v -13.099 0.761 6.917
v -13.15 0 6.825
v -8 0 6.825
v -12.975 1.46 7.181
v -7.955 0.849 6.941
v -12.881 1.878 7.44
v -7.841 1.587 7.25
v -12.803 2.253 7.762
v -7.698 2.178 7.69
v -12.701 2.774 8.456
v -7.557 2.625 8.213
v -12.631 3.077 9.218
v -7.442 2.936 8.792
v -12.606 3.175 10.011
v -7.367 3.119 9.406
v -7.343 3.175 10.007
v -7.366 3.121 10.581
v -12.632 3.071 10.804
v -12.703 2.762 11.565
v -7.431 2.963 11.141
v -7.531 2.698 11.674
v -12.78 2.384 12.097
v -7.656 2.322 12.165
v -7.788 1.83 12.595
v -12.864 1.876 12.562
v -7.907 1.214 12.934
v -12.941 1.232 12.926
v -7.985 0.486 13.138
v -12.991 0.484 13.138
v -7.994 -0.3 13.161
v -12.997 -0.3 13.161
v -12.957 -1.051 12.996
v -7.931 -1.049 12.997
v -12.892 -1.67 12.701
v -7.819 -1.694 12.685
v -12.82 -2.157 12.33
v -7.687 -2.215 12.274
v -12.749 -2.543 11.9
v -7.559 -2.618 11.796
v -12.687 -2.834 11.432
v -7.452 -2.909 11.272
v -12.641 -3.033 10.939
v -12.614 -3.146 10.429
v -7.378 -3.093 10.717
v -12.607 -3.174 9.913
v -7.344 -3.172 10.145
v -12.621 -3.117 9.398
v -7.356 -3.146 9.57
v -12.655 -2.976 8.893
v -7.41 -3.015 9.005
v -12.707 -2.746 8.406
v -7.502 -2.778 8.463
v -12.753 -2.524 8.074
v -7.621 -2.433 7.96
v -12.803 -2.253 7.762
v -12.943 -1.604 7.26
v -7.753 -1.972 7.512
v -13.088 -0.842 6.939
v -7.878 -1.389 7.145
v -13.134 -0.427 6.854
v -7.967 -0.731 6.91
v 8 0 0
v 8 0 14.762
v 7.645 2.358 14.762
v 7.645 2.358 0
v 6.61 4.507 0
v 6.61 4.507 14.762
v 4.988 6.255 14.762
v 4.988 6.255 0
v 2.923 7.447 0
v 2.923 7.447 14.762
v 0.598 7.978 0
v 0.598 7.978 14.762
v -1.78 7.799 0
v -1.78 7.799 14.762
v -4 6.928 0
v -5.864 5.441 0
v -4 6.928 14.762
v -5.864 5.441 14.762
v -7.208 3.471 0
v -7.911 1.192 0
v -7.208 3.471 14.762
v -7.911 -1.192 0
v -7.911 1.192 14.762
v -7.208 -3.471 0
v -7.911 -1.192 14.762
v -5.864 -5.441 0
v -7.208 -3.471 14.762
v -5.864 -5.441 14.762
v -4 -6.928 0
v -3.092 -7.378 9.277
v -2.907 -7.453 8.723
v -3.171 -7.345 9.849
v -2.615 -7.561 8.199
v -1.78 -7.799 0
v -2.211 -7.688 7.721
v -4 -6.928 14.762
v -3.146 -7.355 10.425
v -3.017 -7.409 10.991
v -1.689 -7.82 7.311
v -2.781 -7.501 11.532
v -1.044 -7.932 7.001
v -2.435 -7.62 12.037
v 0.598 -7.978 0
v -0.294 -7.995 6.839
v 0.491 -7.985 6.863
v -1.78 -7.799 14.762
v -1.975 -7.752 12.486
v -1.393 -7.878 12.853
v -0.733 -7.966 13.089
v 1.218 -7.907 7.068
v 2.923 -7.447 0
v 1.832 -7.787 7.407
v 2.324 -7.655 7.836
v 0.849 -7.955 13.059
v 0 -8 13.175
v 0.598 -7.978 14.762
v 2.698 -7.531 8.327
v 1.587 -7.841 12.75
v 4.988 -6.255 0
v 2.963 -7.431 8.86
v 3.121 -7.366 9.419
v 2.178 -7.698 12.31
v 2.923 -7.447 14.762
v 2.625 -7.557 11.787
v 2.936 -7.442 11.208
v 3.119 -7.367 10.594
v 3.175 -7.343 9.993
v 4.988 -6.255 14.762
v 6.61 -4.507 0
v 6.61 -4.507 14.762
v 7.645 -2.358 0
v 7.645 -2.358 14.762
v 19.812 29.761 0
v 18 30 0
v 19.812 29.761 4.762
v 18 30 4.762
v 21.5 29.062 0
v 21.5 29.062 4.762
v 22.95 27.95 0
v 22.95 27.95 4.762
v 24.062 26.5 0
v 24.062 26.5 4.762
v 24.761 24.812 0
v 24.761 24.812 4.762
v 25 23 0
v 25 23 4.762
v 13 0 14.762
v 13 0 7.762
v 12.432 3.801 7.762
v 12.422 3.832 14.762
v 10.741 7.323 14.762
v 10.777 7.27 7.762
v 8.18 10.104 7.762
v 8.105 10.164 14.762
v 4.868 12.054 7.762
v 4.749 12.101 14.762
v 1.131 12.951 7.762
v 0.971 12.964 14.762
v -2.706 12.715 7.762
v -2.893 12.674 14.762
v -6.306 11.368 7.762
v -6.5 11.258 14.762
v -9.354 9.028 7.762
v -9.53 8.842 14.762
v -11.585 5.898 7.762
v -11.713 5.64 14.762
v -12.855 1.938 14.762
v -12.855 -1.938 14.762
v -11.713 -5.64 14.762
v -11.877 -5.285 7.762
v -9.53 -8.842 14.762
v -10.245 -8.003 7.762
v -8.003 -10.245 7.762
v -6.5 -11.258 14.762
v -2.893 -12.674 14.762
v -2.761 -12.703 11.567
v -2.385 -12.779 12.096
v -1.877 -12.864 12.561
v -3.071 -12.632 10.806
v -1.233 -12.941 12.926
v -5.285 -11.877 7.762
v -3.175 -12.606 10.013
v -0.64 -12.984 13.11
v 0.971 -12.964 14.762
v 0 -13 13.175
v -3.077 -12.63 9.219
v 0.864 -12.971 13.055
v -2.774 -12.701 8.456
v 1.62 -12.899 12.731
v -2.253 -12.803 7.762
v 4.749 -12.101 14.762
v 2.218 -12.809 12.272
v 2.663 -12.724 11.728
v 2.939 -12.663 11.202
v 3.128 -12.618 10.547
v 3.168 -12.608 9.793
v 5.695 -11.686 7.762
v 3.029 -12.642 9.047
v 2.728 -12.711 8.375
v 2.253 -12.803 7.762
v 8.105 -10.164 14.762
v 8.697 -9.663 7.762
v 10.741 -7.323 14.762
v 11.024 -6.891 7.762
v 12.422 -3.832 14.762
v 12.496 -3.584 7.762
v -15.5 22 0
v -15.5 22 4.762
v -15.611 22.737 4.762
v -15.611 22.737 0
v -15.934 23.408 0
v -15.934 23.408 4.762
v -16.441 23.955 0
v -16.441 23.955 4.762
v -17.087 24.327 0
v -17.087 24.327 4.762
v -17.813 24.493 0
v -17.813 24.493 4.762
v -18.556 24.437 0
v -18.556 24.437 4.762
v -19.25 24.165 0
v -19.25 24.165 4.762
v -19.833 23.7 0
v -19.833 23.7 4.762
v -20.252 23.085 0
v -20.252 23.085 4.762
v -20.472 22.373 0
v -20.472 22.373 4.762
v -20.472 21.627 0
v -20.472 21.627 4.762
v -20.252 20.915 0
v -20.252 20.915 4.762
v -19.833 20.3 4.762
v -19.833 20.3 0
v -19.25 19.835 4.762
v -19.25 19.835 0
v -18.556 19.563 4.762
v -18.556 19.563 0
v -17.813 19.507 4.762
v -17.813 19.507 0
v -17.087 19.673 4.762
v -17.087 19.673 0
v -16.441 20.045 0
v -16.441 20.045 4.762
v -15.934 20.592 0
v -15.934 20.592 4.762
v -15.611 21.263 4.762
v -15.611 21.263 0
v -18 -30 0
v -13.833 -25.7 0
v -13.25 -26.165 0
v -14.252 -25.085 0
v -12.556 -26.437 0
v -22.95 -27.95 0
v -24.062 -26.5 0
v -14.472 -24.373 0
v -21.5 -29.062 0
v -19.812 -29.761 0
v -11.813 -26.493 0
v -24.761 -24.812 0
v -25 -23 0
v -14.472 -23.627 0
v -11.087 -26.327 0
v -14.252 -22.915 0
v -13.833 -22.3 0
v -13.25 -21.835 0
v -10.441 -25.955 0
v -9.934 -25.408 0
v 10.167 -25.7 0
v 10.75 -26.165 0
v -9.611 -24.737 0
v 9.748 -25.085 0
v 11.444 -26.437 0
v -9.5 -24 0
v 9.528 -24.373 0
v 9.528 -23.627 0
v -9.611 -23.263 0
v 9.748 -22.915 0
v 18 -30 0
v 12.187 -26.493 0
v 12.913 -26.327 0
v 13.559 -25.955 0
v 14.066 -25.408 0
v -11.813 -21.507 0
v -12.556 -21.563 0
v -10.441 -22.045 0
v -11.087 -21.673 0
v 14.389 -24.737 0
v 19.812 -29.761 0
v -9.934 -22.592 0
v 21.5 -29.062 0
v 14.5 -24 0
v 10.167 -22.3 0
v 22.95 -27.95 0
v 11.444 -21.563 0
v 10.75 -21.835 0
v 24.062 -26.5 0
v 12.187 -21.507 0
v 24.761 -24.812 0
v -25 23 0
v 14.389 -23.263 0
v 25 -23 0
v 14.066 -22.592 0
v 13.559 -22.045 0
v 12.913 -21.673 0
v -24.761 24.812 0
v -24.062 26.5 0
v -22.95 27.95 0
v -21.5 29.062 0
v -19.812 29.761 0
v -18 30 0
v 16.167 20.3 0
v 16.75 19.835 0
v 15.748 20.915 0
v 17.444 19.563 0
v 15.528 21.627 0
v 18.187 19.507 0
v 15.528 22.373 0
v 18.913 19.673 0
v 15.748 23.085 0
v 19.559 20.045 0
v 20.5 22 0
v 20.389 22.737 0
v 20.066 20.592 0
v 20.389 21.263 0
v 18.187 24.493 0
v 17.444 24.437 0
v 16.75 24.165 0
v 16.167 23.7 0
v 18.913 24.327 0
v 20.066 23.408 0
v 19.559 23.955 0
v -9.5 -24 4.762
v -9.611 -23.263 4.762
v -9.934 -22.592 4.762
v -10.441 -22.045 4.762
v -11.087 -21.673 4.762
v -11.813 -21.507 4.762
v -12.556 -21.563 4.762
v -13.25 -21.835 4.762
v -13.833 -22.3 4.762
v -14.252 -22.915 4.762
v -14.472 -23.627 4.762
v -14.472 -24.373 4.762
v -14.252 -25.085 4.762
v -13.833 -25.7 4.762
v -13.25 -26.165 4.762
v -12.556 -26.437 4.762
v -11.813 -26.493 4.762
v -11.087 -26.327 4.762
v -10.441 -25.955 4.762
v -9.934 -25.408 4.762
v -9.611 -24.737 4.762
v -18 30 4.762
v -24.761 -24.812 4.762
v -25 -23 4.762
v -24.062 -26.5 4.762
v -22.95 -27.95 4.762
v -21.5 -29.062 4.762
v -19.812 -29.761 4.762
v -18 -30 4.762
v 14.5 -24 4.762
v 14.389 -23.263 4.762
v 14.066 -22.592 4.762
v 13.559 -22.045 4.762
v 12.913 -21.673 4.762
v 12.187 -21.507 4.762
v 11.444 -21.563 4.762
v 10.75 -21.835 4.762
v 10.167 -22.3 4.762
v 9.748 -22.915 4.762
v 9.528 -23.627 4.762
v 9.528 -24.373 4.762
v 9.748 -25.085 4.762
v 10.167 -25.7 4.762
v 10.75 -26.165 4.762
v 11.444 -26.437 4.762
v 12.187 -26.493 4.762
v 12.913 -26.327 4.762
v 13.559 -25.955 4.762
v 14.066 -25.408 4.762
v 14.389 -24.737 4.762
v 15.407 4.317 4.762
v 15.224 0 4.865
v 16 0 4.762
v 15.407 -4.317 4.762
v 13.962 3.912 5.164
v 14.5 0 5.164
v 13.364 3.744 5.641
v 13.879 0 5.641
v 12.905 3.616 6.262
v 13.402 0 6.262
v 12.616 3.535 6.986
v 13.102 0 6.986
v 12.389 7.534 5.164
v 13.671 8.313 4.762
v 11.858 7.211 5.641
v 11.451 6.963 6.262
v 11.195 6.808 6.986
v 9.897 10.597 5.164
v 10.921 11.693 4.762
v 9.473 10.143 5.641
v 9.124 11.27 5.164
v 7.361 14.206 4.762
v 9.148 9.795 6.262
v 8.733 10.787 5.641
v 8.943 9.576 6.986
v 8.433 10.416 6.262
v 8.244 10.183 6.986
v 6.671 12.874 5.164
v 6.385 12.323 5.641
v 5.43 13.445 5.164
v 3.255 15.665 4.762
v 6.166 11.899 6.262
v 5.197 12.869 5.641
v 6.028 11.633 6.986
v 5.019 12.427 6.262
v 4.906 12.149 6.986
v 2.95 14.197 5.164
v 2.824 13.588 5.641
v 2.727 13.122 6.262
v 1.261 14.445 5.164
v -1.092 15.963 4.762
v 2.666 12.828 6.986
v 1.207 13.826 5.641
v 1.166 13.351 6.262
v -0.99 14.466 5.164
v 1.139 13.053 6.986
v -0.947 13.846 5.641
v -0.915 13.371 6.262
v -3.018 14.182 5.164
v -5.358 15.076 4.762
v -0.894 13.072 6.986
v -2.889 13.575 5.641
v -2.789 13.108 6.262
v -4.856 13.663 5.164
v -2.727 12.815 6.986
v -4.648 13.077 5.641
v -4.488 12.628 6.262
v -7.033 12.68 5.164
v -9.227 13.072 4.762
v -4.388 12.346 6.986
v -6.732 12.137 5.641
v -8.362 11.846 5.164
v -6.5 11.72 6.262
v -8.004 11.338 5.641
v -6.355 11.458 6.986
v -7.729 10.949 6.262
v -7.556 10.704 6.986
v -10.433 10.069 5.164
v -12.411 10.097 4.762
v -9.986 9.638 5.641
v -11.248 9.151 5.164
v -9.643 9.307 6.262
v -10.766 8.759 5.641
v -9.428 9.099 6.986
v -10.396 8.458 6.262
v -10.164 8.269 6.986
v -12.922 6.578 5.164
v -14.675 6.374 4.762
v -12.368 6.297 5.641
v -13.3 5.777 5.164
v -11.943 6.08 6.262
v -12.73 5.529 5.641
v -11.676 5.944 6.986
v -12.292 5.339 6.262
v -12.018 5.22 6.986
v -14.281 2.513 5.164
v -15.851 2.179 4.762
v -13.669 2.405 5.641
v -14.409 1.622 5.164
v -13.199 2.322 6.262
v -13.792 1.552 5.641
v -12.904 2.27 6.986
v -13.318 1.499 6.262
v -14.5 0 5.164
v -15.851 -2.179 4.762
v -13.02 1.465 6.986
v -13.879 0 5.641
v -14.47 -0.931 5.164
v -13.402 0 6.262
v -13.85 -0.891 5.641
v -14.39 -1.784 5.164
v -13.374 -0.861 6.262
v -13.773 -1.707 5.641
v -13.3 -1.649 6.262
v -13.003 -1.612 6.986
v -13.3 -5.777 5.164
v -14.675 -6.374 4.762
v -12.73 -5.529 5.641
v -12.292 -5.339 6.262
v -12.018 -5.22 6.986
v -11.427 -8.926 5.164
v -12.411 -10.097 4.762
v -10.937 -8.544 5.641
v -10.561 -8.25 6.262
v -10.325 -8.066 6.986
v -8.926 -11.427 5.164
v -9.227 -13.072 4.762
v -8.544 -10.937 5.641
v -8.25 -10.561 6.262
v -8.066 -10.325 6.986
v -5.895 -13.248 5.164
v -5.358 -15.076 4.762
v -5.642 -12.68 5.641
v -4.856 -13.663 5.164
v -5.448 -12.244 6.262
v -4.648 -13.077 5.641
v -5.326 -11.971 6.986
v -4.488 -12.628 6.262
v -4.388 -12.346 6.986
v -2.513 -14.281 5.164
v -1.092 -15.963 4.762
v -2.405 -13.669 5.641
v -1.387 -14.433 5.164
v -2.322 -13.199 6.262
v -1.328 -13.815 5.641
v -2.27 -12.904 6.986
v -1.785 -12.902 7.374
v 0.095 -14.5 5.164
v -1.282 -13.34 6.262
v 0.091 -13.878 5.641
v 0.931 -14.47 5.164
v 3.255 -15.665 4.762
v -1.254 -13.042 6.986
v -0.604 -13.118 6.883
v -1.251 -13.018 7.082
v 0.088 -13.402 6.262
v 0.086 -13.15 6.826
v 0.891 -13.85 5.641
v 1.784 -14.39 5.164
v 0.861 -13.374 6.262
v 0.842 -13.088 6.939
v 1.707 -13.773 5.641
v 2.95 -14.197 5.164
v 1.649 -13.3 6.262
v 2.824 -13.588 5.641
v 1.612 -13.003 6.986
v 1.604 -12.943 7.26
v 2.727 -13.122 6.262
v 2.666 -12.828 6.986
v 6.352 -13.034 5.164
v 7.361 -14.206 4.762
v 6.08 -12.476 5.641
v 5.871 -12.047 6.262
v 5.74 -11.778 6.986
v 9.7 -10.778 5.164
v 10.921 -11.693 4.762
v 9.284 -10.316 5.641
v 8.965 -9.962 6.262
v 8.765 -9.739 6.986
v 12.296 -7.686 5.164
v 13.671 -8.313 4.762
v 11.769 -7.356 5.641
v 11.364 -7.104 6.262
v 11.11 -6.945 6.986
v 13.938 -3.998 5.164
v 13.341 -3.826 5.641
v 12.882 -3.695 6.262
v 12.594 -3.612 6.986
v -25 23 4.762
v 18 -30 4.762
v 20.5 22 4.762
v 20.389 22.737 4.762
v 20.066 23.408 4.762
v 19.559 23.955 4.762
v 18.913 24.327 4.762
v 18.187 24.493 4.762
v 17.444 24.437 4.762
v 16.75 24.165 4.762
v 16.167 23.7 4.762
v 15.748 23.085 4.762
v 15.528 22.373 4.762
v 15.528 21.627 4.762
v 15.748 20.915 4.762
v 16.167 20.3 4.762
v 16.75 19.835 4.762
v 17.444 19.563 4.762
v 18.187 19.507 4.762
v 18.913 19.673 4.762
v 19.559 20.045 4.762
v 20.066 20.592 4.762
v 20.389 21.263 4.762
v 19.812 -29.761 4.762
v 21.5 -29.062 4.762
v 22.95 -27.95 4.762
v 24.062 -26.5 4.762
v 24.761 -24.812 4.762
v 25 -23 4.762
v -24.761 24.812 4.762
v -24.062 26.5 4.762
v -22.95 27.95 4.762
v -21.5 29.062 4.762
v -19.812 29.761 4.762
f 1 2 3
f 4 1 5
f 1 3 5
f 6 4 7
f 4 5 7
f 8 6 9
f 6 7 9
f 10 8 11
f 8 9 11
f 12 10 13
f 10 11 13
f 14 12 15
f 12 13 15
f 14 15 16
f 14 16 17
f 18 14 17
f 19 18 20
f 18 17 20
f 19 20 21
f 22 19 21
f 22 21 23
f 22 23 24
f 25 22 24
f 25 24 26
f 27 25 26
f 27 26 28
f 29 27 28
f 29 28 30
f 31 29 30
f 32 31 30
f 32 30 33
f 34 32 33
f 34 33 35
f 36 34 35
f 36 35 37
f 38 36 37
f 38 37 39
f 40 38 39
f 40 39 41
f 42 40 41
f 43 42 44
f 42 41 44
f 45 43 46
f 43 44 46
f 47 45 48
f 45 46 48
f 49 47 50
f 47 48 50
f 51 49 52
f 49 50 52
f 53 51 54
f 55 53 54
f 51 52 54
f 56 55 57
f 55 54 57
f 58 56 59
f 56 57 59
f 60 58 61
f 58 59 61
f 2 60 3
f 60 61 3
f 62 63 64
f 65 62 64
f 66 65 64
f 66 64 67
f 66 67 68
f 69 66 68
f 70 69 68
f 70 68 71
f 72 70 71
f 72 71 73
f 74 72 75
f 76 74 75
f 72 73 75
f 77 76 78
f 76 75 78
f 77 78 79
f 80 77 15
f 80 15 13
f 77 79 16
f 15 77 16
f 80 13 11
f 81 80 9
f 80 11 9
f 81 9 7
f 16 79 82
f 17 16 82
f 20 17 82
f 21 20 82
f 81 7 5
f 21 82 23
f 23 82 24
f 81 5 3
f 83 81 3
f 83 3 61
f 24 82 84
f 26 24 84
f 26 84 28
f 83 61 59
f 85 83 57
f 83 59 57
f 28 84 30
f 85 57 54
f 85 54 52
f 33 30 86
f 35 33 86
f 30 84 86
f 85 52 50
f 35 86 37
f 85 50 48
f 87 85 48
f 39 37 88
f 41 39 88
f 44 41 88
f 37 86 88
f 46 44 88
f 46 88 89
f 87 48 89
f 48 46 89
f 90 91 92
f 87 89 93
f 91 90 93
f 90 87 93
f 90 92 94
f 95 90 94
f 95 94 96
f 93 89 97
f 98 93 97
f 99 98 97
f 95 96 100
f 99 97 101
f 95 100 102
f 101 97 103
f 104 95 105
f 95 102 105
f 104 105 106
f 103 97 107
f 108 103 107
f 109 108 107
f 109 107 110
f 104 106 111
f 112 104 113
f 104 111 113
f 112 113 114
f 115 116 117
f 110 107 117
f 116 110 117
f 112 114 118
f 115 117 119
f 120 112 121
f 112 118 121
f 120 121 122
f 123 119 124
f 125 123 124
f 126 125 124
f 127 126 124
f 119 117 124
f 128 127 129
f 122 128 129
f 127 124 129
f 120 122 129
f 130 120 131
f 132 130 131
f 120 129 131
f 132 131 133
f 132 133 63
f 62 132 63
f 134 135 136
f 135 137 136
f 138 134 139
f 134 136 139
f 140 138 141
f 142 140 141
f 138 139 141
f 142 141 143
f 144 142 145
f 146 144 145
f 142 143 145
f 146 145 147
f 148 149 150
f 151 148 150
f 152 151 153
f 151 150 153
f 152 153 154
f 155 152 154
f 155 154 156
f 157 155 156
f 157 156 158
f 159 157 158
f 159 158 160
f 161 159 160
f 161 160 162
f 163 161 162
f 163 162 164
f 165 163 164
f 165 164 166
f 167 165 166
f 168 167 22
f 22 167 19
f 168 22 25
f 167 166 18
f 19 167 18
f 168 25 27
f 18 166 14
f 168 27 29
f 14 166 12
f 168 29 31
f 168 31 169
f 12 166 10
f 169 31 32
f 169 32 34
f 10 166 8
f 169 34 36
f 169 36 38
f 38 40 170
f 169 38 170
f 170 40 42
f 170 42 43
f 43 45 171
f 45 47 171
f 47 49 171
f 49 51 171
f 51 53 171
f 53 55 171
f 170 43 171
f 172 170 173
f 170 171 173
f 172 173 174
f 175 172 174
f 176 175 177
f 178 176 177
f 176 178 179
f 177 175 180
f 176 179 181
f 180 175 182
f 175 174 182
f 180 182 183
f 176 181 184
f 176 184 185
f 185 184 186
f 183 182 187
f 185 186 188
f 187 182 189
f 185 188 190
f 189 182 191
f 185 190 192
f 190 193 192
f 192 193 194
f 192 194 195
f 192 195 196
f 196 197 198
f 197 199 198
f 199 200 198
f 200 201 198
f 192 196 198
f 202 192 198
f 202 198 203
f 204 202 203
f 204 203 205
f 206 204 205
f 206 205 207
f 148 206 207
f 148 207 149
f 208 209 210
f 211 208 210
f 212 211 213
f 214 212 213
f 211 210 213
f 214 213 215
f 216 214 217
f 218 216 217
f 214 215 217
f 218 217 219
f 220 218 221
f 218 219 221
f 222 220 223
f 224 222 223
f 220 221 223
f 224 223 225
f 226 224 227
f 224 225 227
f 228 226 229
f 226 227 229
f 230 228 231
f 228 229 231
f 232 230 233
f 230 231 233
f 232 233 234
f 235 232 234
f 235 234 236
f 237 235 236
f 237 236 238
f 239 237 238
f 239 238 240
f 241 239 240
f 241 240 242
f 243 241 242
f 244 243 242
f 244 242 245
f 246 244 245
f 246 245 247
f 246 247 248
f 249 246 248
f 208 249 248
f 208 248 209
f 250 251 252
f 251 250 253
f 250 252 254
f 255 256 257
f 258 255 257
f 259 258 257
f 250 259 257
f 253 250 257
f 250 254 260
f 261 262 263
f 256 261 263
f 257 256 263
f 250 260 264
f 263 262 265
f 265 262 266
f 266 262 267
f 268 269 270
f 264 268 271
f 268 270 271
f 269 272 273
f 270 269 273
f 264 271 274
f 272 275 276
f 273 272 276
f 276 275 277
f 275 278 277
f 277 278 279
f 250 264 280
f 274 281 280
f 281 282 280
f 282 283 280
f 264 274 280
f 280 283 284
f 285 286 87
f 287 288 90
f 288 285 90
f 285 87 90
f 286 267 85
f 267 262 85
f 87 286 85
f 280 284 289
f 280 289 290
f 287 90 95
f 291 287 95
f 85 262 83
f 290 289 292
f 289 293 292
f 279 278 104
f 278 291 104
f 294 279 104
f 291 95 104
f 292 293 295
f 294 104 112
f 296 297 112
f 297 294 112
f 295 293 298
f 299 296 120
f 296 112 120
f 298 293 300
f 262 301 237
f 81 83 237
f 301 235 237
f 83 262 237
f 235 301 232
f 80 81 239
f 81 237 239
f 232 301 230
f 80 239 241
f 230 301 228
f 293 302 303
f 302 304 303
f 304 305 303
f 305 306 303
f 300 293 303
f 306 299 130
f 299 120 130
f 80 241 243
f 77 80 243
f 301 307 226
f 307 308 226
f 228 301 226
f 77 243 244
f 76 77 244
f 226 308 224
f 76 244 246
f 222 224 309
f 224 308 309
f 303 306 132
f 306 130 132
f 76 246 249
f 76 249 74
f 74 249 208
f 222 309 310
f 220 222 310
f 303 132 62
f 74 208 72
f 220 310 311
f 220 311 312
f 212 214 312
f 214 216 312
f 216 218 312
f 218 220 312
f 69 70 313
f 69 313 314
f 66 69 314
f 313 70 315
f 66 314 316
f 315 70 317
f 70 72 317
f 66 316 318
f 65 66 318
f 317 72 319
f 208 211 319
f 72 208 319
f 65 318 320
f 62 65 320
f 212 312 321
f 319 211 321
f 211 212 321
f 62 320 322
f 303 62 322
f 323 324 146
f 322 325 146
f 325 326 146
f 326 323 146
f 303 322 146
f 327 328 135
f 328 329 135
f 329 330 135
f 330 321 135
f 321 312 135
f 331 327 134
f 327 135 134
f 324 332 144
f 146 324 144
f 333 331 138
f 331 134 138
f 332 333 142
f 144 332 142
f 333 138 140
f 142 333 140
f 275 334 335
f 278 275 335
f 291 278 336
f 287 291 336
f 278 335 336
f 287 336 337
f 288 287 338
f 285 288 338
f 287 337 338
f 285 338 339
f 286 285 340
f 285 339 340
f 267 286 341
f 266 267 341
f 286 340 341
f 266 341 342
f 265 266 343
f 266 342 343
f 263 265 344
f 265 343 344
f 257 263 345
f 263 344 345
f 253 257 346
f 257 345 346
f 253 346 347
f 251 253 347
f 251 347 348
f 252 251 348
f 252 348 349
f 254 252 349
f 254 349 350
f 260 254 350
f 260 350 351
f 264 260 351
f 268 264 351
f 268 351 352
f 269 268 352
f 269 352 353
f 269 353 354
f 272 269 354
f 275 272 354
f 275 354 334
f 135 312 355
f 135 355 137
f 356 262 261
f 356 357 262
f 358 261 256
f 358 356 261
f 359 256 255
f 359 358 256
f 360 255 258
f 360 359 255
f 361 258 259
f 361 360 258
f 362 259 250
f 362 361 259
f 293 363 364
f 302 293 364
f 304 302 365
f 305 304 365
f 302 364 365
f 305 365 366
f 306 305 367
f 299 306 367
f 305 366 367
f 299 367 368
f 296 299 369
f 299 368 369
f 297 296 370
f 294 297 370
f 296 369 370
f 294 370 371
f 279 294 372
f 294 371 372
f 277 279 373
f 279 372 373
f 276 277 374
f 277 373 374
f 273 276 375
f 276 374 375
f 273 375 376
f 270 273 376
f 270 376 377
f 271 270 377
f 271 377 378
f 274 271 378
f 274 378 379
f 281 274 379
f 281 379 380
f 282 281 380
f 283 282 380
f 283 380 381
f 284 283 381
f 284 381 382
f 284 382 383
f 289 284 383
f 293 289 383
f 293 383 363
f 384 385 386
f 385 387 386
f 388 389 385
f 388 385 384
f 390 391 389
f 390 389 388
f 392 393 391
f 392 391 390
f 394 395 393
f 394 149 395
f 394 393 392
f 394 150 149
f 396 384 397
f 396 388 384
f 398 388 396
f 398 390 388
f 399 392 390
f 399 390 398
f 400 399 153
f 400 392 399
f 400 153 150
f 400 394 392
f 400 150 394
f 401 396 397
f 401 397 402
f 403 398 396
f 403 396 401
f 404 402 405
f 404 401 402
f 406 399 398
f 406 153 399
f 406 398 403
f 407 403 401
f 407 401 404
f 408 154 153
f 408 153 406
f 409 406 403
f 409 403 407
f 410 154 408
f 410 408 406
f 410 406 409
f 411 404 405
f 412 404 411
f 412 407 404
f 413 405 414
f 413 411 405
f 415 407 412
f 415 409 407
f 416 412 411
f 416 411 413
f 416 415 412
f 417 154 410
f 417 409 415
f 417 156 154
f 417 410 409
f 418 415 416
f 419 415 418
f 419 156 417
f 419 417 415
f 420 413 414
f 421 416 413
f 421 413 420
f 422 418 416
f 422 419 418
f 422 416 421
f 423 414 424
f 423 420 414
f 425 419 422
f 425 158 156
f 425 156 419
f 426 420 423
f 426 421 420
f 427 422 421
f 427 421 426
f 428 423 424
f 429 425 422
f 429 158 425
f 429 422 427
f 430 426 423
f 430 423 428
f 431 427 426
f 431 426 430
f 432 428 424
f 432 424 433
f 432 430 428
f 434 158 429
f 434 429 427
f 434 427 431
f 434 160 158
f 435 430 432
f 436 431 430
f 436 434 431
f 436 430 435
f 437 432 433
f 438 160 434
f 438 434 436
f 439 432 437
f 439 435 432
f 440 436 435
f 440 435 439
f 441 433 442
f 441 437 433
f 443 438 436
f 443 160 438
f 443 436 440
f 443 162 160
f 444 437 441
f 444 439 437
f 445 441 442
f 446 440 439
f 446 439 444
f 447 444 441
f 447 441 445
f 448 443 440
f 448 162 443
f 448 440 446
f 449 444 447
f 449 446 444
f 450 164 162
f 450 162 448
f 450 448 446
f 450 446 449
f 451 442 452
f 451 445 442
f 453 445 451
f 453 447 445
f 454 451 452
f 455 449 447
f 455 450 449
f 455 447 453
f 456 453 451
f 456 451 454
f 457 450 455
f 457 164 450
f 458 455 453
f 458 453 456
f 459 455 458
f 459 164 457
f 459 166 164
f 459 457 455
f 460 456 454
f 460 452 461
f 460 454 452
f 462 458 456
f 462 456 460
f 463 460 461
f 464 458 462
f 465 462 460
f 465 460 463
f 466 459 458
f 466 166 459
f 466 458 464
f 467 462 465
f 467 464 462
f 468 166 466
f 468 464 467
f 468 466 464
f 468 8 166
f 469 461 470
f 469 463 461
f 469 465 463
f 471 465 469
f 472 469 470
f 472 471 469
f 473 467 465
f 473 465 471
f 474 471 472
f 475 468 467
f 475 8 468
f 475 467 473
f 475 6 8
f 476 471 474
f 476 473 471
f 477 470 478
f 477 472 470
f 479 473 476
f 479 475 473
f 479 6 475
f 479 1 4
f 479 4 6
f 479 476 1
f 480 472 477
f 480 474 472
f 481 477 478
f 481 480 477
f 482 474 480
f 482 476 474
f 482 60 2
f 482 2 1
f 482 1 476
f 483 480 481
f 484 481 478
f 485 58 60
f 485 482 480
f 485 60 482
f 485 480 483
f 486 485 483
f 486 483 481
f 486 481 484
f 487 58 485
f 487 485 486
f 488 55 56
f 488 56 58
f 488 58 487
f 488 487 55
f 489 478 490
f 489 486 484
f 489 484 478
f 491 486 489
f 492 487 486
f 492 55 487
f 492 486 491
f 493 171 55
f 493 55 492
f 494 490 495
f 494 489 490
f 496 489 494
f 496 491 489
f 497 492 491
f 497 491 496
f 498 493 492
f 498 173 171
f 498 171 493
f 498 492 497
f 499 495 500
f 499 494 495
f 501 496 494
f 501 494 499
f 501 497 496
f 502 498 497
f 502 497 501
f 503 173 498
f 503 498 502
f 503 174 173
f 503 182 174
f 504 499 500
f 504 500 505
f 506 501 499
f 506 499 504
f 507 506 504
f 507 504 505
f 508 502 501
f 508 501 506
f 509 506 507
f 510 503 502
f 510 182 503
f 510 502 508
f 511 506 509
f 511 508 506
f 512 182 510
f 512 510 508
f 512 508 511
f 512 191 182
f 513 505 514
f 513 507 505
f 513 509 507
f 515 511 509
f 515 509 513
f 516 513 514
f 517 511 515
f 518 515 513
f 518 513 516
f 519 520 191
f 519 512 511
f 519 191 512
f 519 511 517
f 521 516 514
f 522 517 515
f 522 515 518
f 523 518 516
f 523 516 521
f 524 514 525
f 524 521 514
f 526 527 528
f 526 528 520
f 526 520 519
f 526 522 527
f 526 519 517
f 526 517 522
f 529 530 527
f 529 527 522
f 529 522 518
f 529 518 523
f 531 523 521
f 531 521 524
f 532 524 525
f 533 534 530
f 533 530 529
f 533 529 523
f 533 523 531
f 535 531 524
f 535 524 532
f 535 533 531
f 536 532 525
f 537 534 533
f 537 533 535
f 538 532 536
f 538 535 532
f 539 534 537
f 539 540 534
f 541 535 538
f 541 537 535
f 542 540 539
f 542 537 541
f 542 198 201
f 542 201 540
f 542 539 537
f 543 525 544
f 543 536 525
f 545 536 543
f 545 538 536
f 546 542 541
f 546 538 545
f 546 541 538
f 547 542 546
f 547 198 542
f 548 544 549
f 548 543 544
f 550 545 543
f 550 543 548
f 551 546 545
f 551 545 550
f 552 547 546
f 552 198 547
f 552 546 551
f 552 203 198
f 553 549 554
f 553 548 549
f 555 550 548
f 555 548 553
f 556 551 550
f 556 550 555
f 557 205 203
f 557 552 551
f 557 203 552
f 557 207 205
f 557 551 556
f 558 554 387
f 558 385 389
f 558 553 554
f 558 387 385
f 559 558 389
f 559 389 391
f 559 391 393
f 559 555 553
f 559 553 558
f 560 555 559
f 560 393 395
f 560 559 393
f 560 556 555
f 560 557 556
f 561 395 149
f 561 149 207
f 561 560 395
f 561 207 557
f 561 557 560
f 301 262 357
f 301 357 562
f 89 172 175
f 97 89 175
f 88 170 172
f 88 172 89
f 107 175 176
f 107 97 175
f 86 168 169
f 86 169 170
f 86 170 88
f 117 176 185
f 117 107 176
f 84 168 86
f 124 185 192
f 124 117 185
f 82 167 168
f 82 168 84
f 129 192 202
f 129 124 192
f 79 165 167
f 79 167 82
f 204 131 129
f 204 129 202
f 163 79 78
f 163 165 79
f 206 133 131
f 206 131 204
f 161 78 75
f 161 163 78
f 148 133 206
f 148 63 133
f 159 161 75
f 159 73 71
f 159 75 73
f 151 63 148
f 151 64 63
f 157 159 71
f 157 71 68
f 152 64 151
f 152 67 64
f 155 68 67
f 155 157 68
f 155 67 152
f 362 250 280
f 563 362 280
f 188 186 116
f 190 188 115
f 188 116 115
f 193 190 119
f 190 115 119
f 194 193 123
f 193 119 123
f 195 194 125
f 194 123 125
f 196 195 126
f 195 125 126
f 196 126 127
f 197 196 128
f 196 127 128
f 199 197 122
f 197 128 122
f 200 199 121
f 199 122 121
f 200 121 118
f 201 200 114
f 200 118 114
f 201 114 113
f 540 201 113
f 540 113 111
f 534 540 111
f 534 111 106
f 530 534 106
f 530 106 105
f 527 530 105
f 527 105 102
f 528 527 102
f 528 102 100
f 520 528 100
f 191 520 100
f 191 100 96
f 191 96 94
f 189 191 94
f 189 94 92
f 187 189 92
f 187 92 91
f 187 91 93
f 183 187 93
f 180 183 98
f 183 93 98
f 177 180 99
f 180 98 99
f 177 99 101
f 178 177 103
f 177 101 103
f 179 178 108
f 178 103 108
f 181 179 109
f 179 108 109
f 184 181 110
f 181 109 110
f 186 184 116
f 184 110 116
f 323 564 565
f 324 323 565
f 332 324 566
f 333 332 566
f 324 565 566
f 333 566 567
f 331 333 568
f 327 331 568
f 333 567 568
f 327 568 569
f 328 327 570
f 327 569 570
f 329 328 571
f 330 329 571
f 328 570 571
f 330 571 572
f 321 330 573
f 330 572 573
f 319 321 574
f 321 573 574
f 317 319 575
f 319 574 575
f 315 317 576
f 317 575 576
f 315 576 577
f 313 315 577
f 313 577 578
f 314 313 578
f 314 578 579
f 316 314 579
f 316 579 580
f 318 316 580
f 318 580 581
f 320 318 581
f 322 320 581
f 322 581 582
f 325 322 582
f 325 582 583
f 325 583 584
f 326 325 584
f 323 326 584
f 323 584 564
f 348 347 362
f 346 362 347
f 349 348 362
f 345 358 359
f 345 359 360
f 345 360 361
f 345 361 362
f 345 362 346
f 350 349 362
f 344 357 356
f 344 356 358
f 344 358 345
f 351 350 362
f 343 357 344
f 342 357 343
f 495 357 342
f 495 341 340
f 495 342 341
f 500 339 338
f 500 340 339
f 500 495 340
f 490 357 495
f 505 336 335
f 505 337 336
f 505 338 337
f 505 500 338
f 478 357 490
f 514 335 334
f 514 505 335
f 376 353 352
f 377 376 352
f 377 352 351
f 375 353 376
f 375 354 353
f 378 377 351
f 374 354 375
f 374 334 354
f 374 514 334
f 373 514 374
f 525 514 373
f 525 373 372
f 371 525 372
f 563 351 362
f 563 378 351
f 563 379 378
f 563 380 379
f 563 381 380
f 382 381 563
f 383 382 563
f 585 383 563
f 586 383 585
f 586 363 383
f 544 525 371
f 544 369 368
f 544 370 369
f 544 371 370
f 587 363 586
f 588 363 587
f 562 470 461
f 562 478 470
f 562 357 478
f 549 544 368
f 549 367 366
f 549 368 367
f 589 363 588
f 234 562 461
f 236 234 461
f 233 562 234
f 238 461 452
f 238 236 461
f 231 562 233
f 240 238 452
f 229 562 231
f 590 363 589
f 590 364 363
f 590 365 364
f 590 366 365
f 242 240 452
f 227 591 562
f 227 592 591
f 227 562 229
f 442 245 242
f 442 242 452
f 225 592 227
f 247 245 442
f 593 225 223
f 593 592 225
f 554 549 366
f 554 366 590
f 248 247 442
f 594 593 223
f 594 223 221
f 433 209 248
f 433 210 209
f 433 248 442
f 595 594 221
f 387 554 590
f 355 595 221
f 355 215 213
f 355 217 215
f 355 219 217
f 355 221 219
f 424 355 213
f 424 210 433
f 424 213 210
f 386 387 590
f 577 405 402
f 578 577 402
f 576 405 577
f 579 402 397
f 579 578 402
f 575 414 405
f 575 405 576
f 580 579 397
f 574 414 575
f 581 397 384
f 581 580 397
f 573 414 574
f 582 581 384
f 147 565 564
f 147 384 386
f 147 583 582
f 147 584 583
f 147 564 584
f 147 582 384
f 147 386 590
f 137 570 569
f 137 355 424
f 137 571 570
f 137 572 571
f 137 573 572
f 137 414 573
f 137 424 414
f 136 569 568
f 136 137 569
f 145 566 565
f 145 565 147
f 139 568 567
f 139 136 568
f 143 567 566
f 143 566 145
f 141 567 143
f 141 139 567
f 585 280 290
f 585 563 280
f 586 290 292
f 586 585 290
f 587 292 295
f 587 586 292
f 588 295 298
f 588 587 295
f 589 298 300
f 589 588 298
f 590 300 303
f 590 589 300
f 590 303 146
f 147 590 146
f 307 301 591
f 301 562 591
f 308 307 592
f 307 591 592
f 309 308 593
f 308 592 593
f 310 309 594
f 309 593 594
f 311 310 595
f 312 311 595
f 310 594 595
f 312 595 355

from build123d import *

# Parameters (mm, degrees)
CROQUIS1_W              = 50
CROQUIS1_H              = 60
SALIENTE_EXTRUIR1_DEPTH = 4.7625
CROQUIS2_R              = 13
SALIENTE_EXTRUIR2_DEPTH = 10
CROQUIS3_R              = 8
CORTAR_EXTRUIR1_DEPTH   = 42.748429985
CROQUIS4_R              = 2.5
CORTAR_EXTRUIR2_DEPTH   = 41.311288741
REDONDEO1_R             = 3
REDONDEO2_R             = 7
CROQUIS5_R              = 3.175
CORTAR_EXTRUIR3_DEPTH   = 42.748429985
CROQUIS6_R              = 3.175
CORTAR_EXTRUIR4_DEPTH   = 42.748430021


with BuildPart() as part:
    # Croquis1 → Saliente-Extruir1 (new body)
    with BuildSketch(Plane.XY):
        Rectangle(CROQUIS1_W, CROQUIS1_H)
    extrude(amount=SALIENTE_EXTRUIR1_DEPTH)

    # Croquis2 → Saliente-Extruir2 (add)
    with BuildSketch(Plane.XY.offset(4.7625)):
        Circle(CROQUIS2_R)
    extrude(amount=SALIENTE_EXTRUIR2_DEPTH)

    # Croquis3 → Cortar-Extruir1 (cut, through all)
    with BuildSketch(Plane.XY.offset(14.7625)):
        Circle(CROQUIS3_R)
    extrude(amount=-CORTAR_EXTRUIR1_DEPTH, mode=Mode.SUBTRACT)

    # Croquis4 → Cortar-Extruir2 (cut, through all)
    with BuildSketch(Plane.XY.offset(4.7625)):
        with Locations((18, 22)):
            Circle(CROQUIS4_R)
        with Locations((12, -24)):
            Circle(CROQUIS4_R)
        with Locations((-12, -24)):
            Circle(CROQUIS4_R)
        with Locations((-18, 22)):
            Circle(CROQUIS4_R)
    extrude(amount=-CORTAR_EXTRUIR2_DEPTH, mode=Mode.SUBTRACT)

    # Redondeo1
    redondeo1_edges = [part.edges().sort_by_distance(p)[0] for p in [
        (-13, 0, 4.7625),
    ]]
    fillet(redondeo1_edges, radius=REDONDEO1_R)

    # Redondeo2
    redondeo2_edges = [part.edges().sort_by_distance(p)[0] for p in [
        (25, -30, 2.38125),
        (-25, -30, 2.38125),
        (-25, 30, 2.38125),
        (25, 30, 2.38125),
    ]]
    fillet(redondeo2_edges, radius=REDONDEO2_R)

    # Croquis5 → Cortar-Extruir3 (cut, through all)
    with BuildSketch(Plane(origin=(0, 0, 0), x_dir=(1, 0, 0), z_dir=(0, 1, 0))):
        with Locations(Location((0, -10, 0), (0, 0, 270))):
            Circle(CROQUIS5_R)
    extrude(amount=-CORTAR_EXTRUIR3_DEPTH, mode=Mode.SUBTRACT)

    # Croquis6 → Cortar-Extruir4 (cut, through all)
    with BuildSketch(Plane(origin=(0, 0, 0), x_dir=(0, 0, -1), z_dir=(1, 0, 0))):
        with Locations((-10, 0)):
            Circle(CROQUIS6_R)
    extrude(amount=-CORTAR_EXTRUIR4_DEPTH, mode=Mode.SUBTRACT)


solid = part.part
